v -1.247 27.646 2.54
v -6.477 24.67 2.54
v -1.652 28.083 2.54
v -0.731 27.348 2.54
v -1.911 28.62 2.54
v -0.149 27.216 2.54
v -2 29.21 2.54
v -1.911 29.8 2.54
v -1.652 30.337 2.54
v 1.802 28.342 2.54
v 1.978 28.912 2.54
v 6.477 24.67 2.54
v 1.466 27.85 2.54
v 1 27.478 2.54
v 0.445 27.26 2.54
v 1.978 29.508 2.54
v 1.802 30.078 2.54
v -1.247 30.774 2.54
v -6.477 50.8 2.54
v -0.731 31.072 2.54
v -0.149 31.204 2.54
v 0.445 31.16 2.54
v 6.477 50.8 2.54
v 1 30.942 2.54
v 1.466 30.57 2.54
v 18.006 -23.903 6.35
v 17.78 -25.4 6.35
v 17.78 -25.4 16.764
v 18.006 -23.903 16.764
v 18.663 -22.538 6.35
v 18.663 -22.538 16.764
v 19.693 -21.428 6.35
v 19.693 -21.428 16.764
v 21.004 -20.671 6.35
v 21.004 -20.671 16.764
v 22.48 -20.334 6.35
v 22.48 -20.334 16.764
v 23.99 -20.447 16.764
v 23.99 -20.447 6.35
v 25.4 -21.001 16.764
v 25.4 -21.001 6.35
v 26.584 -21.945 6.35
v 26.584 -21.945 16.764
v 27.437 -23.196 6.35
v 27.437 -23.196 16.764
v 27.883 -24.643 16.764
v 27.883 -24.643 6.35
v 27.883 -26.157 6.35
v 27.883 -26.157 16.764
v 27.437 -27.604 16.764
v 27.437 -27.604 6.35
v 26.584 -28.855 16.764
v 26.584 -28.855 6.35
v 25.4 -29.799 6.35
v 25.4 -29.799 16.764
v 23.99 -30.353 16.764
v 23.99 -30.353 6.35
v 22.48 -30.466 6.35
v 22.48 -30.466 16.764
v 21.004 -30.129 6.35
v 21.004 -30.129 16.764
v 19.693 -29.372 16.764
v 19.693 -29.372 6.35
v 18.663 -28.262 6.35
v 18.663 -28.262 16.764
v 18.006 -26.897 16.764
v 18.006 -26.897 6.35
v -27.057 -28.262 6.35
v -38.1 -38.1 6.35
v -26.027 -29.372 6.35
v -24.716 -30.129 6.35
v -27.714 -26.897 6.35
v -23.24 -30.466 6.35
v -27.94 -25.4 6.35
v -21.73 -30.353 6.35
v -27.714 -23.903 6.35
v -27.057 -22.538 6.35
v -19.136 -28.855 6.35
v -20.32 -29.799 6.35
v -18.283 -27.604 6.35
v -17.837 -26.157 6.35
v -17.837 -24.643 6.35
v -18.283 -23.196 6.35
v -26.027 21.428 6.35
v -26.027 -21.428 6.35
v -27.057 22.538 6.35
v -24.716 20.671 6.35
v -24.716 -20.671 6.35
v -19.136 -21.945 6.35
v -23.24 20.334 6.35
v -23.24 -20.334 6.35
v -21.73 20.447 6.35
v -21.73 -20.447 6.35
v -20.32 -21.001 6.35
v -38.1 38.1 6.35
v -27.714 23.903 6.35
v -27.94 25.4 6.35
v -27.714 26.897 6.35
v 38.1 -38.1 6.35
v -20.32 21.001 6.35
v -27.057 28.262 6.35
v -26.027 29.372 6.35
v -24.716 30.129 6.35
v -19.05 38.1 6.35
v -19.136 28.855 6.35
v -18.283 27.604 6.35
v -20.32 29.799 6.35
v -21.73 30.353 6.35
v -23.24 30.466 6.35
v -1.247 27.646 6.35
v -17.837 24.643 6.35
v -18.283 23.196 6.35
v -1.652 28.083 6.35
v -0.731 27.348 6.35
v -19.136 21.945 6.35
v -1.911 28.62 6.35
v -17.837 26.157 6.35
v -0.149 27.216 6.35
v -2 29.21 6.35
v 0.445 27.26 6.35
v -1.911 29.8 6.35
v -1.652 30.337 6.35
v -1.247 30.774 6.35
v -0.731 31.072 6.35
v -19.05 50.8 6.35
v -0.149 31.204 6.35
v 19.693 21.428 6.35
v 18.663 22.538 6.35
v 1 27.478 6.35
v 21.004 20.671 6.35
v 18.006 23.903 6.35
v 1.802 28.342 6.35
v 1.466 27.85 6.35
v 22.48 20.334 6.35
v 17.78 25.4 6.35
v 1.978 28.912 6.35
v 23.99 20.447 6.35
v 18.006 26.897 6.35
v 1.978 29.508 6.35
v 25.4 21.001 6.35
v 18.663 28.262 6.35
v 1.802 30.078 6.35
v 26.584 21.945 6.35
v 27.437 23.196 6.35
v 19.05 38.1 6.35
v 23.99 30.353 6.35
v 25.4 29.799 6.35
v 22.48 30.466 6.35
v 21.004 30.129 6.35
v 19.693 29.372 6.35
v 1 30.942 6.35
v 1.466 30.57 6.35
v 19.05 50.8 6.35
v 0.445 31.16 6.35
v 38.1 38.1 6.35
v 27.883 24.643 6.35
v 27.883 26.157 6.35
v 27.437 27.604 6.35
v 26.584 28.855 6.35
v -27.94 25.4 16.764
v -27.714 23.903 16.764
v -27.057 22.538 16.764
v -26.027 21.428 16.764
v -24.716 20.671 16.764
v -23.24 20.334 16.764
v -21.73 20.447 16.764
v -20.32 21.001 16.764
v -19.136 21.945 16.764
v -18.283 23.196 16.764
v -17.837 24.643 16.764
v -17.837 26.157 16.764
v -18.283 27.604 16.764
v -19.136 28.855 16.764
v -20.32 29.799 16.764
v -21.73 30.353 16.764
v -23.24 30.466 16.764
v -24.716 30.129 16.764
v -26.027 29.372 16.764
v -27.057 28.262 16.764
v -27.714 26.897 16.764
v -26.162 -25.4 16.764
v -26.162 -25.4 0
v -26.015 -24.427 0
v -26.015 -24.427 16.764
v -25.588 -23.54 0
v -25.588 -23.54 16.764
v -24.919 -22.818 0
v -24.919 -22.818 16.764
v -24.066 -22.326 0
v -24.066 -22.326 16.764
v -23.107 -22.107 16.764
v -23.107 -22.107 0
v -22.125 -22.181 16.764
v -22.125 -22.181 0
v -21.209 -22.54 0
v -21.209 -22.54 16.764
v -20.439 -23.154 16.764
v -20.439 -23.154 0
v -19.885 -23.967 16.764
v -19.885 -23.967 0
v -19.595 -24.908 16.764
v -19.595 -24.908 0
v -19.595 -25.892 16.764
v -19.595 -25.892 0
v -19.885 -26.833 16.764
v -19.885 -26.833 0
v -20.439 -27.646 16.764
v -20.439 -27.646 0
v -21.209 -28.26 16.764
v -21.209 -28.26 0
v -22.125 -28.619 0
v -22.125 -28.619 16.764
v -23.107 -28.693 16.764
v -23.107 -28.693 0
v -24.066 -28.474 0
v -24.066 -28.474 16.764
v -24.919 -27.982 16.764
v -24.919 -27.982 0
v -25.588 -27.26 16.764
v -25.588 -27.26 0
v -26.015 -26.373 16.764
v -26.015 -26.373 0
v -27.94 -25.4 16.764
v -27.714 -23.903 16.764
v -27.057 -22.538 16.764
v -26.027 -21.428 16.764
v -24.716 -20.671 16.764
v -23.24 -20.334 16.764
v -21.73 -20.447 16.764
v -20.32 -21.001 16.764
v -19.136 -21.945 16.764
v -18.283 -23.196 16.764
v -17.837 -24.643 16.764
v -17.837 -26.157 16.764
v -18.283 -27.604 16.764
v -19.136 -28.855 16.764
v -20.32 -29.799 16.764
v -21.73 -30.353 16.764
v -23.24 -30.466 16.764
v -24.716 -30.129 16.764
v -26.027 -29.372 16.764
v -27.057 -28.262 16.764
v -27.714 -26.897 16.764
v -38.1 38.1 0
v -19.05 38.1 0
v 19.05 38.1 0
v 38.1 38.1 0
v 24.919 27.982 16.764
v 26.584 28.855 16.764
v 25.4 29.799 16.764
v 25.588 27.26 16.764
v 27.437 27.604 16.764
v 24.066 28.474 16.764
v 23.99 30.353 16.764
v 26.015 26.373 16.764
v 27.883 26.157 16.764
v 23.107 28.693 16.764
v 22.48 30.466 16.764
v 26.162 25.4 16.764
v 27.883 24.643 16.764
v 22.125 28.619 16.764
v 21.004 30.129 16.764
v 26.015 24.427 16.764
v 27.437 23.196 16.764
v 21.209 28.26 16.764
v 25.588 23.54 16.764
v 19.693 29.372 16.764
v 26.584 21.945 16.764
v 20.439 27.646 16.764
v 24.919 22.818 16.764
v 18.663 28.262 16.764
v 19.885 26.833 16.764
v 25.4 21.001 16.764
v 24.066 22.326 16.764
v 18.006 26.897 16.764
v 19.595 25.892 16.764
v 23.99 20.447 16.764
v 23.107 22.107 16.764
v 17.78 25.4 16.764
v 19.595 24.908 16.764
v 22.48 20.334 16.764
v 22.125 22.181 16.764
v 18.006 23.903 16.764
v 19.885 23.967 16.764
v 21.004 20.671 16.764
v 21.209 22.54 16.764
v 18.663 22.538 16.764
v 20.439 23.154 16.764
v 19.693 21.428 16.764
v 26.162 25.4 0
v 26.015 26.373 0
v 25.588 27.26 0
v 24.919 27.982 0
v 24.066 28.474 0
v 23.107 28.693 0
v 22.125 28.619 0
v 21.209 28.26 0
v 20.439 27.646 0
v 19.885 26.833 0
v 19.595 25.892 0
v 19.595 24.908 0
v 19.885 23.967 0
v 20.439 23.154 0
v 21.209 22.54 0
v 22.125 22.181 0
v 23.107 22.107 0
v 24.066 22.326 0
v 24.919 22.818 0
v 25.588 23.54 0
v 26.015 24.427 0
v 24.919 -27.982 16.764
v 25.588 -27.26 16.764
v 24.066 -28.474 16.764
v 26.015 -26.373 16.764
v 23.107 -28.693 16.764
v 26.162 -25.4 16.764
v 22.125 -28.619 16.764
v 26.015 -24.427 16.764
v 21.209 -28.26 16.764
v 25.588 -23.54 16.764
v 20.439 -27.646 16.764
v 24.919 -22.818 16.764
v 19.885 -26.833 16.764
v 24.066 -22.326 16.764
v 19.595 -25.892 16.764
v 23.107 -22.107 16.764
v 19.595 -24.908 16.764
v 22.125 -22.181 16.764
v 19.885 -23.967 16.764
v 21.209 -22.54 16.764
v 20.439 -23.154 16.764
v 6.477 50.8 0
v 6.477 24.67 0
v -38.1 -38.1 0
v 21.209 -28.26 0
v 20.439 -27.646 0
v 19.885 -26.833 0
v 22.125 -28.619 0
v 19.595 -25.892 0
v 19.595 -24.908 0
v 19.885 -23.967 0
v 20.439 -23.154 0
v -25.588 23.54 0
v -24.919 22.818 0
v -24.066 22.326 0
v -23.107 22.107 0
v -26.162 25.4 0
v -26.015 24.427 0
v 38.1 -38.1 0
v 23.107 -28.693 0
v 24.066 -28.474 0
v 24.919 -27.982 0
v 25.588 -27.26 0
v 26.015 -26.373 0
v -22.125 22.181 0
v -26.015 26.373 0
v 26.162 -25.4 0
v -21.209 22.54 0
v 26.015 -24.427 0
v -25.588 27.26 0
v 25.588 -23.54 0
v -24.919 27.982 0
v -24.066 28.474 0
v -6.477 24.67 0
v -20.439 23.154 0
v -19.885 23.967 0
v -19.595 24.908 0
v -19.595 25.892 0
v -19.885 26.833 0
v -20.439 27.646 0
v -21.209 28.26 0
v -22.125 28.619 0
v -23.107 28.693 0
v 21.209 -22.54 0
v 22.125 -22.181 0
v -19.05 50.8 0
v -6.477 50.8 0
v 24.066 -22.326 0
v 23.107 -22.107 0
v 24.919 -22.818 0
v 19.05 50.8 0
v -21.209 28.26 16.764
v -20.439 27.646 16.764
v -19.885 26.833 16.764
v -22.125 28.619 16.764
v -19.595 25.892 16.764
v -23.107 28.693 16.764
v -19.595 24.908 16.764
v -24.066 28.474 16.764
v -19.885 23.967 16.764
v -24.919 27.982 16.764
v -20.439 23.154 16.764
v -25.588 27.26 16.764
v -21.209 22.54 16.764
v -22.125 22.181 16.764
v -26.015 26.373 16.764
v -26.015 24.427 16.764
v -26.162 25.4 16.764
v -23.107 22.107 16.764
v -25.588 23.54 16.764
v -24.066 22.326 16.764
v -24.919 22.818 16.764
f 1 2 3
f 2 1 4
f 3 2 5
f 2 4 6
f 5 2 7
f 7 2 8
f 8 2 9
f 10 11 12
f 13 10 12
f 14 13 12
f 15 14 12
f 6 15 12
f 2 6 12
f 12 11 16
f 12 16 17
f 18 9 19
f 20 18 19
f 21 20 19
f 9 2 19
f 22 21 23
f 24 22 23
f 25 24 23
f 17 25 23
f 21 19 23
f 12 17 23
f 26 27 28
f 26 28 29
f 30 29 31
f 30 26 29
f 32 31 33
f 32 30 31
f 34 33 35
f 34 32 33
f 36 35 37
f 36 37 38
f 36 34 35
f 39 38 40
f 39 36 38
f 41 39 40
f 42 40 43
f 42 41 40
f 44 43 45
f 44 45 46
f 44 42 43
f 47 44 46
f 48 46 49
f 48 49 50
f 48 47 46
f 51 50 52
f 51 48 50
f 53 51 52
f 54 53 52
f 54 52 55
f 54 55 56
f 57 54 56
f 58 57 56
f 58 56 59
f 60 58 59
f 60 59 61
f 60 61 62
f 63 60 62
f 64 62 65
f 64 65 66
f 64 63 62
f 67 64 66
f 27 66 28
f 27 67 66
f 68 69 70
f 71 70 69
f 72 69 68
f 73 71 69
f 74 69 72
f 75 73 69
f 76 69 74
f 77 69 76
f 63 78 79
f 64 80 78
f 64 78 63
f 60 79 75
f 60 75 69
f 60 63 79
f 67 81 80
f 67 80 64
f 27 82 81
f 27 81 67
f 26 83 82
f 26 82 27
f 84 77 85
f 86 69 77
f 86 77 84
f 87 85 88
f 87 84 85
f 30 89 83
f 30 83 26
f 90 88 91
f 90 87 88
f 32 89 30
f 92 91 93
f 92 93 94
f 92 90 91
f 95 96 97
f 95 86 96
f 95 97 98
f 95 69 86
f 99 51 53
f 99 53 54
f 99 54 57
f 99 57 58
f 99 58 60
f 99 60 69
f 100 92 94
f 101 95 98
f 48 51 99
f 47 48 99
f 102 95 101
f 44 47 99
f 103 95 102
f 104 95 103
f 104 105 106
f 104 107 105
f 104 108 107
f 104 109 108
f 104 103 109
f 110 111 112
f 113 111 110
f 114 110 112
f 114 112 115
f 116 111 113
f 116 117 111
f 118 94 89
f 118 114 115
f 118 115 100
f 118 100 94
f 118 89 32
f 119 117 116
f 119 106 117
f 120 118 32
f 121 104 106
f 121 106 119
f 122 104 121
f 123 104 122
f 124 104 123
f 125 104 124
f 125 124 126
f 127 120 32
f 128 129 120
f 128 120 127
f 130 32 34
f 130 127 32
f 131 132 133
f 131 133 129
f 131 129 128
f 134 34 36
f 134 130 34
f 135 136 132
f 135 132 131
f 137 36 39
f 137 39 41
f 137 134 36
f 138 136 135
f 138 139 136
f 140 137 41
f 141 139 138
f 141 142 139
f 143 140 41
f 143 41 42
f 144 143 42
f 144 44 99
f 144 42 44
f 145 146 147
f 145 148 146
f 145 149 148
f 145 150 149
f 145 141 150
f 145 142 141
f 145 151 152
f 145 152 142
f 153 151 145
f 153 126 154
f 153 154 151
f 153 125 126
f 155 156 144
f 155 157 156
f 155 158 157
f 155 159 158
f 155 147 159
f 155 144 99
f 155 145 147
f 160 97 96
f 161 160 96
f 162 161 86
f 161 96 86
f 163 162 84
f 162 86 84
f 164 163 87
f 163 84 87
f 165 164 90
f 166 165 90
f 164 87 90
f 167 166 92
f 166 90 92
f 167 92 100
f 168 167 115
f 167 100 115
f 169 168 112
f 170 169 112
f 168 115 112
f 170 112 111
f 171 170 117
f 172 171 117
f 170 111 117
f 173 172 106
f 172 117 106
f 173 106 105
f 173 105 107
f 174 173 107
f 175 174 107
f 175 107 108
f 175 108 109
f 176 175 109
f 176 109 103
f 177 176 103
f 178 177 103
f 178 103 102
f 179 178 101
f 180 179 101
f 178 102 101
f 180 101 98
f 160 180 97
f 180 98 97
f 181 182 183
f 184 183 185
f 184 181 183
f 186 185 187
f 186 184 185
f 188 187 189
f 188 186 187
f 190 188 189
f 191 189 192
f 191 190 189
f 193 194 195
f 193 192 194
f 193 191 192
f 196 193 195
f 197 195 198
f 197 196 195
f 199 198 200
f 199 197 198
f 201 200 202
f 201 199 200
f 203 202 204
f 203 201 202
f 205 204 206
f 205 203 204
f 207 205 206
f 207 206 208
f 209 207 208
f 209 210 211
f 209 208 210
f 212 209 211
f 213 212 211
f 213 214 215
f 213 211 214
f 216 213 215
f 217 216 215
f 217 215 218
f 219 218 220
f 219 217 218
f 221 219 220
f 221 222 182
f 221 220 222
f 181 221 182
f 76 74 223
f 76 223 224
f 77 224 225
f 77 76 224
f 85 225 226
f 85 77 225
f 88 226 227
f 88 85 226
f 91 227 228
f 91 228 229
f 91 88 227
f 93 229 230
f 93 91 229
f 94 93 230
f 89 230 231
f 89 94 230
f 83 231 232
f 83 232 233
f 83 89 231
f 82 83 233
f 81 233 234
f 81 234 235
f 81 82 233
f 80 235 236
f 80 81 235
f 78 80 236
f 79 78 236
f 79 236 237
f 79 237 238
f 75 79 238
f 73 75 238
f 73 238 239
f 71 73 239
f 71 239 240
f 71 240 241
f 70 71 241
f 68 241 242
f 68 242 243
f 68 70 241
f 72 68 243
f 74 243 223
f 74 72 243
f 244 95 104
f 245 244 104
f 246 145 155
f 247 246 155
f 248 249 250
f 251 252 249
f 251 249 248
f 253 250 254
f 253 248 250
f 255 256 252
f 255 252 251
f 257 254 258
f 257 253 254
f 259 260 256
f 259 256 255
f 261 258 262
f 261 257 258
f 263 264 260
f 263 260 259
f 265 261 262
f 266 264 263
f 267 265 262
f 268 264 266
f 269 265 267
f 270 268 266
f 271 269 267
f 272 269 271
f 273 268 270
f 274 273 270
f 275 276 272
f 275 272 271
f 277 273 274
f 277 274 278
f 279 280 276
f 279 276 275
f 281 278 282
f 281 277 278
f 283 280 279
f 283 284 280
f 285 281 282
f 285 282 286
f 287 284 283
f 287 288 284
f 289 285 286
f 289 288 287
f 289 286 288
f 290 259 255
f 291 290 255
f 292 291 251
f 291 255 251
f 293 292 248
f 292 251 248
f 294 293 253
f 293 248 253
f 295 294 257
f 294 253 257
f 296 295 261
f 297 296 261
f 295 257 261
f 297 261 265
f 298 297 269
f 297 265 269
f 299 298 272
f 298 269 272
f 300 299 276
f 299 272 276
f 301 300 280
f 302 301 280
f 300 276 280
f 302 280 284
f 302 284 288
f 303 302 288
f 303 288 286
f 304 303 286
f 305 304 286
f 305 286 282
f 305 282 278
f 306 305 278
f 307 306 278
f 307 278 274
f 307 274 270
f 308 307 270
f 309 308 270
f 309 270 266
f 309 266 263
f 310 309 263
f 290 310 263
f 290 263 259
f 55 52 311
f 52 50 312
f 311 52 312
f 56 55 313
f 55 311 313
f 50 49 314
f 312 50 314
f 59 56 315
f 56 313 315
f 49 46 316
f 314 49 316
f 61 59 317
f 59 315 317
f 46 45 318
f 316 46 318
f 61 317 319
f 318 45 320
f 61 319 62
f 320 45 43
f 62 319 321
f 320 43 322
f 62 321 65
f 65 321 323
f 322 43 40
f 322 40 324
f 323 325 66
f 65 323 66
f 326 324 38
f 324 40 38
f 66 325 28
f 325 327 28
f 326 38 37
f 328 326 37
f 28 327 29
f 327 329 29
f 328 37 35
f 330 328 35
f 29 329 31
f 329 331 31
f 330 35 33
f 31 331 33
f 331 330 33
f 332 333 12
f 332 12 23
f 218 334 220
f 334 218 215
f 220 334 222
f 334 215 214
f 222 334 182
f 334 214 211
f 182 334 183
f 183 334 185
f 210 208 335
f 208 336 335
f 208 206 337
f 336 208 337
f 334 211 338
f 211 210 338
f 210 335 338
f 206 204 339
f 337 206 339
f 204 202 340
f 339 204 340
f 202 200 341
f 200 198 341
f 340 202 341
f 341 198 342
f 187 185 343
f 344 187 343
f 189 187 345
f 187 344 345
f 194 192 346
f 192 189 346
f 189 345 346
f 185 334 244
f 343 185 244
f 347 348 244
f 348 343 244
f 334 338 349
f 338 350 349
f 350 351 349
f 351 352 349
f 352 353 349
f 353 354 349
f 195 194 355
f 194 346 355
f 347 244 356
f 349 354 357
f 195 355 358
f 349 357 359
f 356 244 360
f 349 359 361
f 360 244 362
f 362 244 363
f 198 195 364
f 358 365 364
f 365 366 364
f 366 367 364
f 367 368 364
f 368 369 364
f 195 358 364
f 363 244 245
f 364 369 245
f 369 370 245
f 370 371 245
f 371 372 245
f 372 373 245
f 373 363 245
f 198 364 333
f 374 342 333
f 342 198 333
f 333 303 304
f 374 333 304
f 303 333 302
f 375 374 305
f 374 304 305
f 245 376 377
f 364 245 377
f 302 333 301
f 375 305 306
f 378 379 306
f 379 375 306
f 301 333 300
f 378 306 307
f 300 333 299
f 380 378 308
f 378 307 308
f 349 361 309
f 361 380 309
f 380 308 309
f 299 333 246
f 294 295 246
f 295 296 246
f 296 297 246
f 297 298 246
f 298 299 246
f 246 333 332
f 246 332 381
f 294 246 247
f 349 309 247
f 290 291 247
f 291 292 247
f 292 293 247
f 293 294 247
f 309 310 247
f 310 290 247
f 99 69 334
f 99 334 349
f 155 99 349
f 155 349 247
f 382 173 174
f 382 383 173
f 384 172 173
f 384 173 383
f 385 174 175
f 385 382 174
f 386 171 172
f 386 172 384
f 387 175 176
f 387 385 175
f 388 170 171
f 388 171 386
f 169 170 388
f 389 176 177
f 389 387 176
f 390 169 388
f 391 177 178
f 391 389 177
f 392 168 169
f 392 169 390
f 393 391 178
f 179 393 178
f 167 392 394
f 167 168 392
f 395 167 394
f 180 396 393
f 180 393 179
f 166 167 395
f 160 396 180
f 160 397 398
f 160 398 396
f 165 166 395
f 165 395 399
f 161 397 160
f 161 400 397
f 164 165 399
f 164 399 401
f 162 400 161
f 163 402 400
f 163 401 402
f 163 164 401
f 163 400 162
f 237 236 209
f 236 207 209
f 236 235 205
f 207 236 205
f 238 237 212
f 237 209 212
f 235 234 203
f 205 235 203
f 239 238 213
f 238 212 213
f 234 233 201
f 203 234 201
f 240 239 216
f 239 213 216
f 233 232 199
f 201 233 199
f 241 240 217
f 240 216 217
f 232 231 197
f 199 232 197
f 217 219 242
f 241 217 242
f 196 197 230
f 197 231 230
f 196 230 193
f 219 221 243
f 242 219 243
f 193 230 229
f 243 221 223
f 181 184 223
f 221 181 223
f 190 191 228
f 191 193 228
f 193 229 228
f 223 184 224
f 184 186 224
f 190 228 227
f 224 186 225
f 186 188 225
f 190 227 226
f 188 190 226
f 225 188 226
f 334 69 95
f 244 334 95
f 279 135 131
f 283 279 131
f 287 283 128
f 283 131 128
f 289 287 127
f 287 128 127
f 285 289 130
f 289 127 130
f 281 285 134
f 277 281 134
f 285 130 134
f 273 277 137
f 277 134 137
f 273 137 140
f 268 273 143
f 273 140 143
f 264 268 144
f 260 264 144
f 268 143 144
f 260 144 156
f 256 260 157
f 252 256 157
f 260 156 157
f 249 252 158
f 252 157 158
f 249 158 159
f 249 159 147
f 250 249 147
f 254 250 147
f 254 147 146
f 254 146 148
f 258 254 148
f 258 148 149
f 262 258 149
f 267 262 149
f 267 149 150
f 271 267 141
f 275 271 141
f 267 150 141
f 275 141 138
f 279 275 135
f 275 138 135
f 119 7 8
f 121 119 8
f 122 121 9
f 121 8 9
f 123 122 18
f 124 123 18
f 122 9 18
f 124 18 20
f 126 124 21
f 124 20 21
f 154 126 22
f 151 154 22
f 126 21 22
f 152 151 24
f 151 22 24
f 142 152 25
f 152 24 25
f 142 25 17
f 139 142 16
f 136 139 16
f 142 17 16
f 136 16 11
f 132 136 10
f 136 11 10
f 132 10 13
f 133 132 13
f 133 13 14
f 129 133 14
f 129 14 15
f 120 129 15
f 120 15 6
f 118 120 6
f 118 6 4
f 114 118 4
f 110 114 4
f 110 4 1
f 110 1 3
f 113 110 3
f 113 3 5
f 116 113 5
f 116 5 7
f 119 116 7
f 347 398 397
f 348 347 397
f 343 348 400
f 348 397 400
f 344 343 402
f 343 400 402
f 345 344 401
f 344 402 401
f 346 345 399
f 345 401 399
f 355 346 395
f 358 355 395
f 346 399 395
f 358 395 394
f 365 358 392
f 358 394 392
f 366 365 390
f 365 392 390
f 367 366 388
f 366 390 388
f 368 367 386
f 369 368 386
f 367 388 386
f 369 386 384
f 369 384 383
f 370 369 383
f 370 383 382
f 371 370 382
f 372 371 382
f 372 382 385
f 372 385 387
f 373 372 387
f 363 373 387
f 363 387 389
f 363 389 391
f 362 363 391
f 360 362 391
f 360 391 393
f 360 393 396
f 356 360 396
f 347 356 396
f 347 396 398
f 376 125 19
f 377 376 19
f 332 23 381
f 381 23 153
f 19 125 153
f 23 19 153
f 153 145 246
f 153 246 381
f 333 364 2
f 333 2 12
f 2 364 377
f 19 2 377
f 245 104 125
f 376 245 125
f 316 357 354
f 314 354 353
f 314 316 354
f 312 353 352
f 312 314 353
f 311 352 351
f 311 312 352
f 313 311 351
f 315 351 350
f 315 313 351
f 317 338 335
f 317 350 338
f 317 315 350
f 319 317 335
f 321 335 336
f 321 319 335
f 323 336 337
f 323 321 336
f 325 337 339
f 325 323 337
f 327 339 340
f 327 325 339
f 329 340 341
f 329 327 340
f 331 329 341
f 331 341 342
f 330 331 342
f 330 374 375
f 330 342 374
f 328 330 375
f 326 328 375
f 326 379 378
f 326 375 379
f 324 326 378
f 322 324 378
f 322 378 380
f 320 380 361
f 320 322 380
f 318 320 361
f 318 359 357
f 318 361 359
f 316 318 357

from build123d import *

# Parameters (mm, degrees)
SKETCH1_W           = 38.1
SKETCH1_H           = 76.2
BOSS_EXTRUDE1_DEPTH = 6.35
SKETCH8_W           = 19.05
SKETCH8_H           = 76.2
BOSS_EXTRUDE5_DEPTH = 6.35
SKETCH5_R           = 5.08
BOSS_EXTRUDE2_DEPTH = 10.414
SKETCH6_R           = 3.302
CUT_EXTRUDE3_DEPTH  = 57.429174157
SKETCH7_W           = 38.1
SKETCH7_H           = 12.7
BOSS_EXTRUDE4_DEPTH = 6.35
SKETCH9_R           = 2
CUT_EXTRUDE4_DEPTH  = 66.675579145
SKETCH10_W          = 12.954
SKETCH10_H          = 26.13
CUT_EXTRUDE5_DEPTH  = 2.54


with BuildPart() as part:
    # Sketch1 → Boss-Extrude1 (new body)
    with BuildSketch(Plane.XY):
        Rectangle(SKETCH1_W, SKETCH1_H)
    extrude(amount=BOSS_EXTRUDE1_DEPTH)

    # Sketch8 → Boss-Extrude5 (add)
    with BuildSketch(Plane.XY.offset(6.35)):
        with Locations((-28.575, 0)):
            Rectangle(SKETCH8_W, SKETCH8_H)
        with Locations((28.575, 0)):
            Rectangle(SKETCH8_W, SKETCH8_H)
    extrude(amount=-BOSS_EXTRUDE5_DEPTH)

    # Sketch5 → Boss-Extrude2 (add)
    with BuildSketch(Plane.XY.offset(6.35)):
        with Locations(Location((22.86, 25.4, 0), (0, 0, 180))):
            Circle(SKETCH5_R)
        with Locations(Location((-22.86, 25.4, 0), (0, 0, 180))):
            Circle(SKETCH5_R)
    boss_extrude2 = extrude(amount=BOSS_EXTRUDE2_DEPTH)

    # Sketch6 → Cut-Extrude3 (cut, through all)
    with BuildSketch(Plane.XY.offset(16.764)):
        with Locations((22.86, 25.4)):
            Circle(SKETCH6_R)
        with Locations(Location((-22.86, 25.4, 0), (0, 0, 180))):
            Circle(SKETCH6_R)
    cut_extrude3 = extrude(amount=-CUT_EXTRUDE3_DEPTH, mode=Mode.SUBTRACT)

    # Mirror1: Boss-Extrude2, Cut-Extrude3 across plane
    add(boss_extrude2.mirror(Plane.ZX))
    add(cut_extrude3.mirror(Plane.ZX), mode=Mode.SUBTRACT)

    # Sketch7 → Boss-Extrude4 (add)
    with BuildSketch(Plane.XY.offset(6.35)):
        with Locations((0, 44.45)):
            Rectangle(SKETCH7_W, SKETCH7_H)
    extrude(amount=-BOSS_EXTRUDE4_DEPTH)

    # Sketch9 → Cut-Extrude4 (cut, through all)
    with BuildSketch(Plane(origin=(0, 0, 0), x_dir=(-1, 0, 0), z_dir=(0, 0, -1))):
        with Locations((0, 29.21)):
            Circle(SKETCH9_R)
    extrude(amount=-CUT_EXTRUDE4_DEPTH, mode=Mode.SUBTRACT)

    # Sketch10 → Cut-Extrude5 (cut)
    with BuildSketch(Plane.XY):
        with Locations((0, 37.735)):
            Rectangle(SKETCH10_W, SKETCH10_H)
    extrude(amount=CUT_EXTRUDE5_DEPTH, mode=Mode.SUBTRACT)


solid = part.part
